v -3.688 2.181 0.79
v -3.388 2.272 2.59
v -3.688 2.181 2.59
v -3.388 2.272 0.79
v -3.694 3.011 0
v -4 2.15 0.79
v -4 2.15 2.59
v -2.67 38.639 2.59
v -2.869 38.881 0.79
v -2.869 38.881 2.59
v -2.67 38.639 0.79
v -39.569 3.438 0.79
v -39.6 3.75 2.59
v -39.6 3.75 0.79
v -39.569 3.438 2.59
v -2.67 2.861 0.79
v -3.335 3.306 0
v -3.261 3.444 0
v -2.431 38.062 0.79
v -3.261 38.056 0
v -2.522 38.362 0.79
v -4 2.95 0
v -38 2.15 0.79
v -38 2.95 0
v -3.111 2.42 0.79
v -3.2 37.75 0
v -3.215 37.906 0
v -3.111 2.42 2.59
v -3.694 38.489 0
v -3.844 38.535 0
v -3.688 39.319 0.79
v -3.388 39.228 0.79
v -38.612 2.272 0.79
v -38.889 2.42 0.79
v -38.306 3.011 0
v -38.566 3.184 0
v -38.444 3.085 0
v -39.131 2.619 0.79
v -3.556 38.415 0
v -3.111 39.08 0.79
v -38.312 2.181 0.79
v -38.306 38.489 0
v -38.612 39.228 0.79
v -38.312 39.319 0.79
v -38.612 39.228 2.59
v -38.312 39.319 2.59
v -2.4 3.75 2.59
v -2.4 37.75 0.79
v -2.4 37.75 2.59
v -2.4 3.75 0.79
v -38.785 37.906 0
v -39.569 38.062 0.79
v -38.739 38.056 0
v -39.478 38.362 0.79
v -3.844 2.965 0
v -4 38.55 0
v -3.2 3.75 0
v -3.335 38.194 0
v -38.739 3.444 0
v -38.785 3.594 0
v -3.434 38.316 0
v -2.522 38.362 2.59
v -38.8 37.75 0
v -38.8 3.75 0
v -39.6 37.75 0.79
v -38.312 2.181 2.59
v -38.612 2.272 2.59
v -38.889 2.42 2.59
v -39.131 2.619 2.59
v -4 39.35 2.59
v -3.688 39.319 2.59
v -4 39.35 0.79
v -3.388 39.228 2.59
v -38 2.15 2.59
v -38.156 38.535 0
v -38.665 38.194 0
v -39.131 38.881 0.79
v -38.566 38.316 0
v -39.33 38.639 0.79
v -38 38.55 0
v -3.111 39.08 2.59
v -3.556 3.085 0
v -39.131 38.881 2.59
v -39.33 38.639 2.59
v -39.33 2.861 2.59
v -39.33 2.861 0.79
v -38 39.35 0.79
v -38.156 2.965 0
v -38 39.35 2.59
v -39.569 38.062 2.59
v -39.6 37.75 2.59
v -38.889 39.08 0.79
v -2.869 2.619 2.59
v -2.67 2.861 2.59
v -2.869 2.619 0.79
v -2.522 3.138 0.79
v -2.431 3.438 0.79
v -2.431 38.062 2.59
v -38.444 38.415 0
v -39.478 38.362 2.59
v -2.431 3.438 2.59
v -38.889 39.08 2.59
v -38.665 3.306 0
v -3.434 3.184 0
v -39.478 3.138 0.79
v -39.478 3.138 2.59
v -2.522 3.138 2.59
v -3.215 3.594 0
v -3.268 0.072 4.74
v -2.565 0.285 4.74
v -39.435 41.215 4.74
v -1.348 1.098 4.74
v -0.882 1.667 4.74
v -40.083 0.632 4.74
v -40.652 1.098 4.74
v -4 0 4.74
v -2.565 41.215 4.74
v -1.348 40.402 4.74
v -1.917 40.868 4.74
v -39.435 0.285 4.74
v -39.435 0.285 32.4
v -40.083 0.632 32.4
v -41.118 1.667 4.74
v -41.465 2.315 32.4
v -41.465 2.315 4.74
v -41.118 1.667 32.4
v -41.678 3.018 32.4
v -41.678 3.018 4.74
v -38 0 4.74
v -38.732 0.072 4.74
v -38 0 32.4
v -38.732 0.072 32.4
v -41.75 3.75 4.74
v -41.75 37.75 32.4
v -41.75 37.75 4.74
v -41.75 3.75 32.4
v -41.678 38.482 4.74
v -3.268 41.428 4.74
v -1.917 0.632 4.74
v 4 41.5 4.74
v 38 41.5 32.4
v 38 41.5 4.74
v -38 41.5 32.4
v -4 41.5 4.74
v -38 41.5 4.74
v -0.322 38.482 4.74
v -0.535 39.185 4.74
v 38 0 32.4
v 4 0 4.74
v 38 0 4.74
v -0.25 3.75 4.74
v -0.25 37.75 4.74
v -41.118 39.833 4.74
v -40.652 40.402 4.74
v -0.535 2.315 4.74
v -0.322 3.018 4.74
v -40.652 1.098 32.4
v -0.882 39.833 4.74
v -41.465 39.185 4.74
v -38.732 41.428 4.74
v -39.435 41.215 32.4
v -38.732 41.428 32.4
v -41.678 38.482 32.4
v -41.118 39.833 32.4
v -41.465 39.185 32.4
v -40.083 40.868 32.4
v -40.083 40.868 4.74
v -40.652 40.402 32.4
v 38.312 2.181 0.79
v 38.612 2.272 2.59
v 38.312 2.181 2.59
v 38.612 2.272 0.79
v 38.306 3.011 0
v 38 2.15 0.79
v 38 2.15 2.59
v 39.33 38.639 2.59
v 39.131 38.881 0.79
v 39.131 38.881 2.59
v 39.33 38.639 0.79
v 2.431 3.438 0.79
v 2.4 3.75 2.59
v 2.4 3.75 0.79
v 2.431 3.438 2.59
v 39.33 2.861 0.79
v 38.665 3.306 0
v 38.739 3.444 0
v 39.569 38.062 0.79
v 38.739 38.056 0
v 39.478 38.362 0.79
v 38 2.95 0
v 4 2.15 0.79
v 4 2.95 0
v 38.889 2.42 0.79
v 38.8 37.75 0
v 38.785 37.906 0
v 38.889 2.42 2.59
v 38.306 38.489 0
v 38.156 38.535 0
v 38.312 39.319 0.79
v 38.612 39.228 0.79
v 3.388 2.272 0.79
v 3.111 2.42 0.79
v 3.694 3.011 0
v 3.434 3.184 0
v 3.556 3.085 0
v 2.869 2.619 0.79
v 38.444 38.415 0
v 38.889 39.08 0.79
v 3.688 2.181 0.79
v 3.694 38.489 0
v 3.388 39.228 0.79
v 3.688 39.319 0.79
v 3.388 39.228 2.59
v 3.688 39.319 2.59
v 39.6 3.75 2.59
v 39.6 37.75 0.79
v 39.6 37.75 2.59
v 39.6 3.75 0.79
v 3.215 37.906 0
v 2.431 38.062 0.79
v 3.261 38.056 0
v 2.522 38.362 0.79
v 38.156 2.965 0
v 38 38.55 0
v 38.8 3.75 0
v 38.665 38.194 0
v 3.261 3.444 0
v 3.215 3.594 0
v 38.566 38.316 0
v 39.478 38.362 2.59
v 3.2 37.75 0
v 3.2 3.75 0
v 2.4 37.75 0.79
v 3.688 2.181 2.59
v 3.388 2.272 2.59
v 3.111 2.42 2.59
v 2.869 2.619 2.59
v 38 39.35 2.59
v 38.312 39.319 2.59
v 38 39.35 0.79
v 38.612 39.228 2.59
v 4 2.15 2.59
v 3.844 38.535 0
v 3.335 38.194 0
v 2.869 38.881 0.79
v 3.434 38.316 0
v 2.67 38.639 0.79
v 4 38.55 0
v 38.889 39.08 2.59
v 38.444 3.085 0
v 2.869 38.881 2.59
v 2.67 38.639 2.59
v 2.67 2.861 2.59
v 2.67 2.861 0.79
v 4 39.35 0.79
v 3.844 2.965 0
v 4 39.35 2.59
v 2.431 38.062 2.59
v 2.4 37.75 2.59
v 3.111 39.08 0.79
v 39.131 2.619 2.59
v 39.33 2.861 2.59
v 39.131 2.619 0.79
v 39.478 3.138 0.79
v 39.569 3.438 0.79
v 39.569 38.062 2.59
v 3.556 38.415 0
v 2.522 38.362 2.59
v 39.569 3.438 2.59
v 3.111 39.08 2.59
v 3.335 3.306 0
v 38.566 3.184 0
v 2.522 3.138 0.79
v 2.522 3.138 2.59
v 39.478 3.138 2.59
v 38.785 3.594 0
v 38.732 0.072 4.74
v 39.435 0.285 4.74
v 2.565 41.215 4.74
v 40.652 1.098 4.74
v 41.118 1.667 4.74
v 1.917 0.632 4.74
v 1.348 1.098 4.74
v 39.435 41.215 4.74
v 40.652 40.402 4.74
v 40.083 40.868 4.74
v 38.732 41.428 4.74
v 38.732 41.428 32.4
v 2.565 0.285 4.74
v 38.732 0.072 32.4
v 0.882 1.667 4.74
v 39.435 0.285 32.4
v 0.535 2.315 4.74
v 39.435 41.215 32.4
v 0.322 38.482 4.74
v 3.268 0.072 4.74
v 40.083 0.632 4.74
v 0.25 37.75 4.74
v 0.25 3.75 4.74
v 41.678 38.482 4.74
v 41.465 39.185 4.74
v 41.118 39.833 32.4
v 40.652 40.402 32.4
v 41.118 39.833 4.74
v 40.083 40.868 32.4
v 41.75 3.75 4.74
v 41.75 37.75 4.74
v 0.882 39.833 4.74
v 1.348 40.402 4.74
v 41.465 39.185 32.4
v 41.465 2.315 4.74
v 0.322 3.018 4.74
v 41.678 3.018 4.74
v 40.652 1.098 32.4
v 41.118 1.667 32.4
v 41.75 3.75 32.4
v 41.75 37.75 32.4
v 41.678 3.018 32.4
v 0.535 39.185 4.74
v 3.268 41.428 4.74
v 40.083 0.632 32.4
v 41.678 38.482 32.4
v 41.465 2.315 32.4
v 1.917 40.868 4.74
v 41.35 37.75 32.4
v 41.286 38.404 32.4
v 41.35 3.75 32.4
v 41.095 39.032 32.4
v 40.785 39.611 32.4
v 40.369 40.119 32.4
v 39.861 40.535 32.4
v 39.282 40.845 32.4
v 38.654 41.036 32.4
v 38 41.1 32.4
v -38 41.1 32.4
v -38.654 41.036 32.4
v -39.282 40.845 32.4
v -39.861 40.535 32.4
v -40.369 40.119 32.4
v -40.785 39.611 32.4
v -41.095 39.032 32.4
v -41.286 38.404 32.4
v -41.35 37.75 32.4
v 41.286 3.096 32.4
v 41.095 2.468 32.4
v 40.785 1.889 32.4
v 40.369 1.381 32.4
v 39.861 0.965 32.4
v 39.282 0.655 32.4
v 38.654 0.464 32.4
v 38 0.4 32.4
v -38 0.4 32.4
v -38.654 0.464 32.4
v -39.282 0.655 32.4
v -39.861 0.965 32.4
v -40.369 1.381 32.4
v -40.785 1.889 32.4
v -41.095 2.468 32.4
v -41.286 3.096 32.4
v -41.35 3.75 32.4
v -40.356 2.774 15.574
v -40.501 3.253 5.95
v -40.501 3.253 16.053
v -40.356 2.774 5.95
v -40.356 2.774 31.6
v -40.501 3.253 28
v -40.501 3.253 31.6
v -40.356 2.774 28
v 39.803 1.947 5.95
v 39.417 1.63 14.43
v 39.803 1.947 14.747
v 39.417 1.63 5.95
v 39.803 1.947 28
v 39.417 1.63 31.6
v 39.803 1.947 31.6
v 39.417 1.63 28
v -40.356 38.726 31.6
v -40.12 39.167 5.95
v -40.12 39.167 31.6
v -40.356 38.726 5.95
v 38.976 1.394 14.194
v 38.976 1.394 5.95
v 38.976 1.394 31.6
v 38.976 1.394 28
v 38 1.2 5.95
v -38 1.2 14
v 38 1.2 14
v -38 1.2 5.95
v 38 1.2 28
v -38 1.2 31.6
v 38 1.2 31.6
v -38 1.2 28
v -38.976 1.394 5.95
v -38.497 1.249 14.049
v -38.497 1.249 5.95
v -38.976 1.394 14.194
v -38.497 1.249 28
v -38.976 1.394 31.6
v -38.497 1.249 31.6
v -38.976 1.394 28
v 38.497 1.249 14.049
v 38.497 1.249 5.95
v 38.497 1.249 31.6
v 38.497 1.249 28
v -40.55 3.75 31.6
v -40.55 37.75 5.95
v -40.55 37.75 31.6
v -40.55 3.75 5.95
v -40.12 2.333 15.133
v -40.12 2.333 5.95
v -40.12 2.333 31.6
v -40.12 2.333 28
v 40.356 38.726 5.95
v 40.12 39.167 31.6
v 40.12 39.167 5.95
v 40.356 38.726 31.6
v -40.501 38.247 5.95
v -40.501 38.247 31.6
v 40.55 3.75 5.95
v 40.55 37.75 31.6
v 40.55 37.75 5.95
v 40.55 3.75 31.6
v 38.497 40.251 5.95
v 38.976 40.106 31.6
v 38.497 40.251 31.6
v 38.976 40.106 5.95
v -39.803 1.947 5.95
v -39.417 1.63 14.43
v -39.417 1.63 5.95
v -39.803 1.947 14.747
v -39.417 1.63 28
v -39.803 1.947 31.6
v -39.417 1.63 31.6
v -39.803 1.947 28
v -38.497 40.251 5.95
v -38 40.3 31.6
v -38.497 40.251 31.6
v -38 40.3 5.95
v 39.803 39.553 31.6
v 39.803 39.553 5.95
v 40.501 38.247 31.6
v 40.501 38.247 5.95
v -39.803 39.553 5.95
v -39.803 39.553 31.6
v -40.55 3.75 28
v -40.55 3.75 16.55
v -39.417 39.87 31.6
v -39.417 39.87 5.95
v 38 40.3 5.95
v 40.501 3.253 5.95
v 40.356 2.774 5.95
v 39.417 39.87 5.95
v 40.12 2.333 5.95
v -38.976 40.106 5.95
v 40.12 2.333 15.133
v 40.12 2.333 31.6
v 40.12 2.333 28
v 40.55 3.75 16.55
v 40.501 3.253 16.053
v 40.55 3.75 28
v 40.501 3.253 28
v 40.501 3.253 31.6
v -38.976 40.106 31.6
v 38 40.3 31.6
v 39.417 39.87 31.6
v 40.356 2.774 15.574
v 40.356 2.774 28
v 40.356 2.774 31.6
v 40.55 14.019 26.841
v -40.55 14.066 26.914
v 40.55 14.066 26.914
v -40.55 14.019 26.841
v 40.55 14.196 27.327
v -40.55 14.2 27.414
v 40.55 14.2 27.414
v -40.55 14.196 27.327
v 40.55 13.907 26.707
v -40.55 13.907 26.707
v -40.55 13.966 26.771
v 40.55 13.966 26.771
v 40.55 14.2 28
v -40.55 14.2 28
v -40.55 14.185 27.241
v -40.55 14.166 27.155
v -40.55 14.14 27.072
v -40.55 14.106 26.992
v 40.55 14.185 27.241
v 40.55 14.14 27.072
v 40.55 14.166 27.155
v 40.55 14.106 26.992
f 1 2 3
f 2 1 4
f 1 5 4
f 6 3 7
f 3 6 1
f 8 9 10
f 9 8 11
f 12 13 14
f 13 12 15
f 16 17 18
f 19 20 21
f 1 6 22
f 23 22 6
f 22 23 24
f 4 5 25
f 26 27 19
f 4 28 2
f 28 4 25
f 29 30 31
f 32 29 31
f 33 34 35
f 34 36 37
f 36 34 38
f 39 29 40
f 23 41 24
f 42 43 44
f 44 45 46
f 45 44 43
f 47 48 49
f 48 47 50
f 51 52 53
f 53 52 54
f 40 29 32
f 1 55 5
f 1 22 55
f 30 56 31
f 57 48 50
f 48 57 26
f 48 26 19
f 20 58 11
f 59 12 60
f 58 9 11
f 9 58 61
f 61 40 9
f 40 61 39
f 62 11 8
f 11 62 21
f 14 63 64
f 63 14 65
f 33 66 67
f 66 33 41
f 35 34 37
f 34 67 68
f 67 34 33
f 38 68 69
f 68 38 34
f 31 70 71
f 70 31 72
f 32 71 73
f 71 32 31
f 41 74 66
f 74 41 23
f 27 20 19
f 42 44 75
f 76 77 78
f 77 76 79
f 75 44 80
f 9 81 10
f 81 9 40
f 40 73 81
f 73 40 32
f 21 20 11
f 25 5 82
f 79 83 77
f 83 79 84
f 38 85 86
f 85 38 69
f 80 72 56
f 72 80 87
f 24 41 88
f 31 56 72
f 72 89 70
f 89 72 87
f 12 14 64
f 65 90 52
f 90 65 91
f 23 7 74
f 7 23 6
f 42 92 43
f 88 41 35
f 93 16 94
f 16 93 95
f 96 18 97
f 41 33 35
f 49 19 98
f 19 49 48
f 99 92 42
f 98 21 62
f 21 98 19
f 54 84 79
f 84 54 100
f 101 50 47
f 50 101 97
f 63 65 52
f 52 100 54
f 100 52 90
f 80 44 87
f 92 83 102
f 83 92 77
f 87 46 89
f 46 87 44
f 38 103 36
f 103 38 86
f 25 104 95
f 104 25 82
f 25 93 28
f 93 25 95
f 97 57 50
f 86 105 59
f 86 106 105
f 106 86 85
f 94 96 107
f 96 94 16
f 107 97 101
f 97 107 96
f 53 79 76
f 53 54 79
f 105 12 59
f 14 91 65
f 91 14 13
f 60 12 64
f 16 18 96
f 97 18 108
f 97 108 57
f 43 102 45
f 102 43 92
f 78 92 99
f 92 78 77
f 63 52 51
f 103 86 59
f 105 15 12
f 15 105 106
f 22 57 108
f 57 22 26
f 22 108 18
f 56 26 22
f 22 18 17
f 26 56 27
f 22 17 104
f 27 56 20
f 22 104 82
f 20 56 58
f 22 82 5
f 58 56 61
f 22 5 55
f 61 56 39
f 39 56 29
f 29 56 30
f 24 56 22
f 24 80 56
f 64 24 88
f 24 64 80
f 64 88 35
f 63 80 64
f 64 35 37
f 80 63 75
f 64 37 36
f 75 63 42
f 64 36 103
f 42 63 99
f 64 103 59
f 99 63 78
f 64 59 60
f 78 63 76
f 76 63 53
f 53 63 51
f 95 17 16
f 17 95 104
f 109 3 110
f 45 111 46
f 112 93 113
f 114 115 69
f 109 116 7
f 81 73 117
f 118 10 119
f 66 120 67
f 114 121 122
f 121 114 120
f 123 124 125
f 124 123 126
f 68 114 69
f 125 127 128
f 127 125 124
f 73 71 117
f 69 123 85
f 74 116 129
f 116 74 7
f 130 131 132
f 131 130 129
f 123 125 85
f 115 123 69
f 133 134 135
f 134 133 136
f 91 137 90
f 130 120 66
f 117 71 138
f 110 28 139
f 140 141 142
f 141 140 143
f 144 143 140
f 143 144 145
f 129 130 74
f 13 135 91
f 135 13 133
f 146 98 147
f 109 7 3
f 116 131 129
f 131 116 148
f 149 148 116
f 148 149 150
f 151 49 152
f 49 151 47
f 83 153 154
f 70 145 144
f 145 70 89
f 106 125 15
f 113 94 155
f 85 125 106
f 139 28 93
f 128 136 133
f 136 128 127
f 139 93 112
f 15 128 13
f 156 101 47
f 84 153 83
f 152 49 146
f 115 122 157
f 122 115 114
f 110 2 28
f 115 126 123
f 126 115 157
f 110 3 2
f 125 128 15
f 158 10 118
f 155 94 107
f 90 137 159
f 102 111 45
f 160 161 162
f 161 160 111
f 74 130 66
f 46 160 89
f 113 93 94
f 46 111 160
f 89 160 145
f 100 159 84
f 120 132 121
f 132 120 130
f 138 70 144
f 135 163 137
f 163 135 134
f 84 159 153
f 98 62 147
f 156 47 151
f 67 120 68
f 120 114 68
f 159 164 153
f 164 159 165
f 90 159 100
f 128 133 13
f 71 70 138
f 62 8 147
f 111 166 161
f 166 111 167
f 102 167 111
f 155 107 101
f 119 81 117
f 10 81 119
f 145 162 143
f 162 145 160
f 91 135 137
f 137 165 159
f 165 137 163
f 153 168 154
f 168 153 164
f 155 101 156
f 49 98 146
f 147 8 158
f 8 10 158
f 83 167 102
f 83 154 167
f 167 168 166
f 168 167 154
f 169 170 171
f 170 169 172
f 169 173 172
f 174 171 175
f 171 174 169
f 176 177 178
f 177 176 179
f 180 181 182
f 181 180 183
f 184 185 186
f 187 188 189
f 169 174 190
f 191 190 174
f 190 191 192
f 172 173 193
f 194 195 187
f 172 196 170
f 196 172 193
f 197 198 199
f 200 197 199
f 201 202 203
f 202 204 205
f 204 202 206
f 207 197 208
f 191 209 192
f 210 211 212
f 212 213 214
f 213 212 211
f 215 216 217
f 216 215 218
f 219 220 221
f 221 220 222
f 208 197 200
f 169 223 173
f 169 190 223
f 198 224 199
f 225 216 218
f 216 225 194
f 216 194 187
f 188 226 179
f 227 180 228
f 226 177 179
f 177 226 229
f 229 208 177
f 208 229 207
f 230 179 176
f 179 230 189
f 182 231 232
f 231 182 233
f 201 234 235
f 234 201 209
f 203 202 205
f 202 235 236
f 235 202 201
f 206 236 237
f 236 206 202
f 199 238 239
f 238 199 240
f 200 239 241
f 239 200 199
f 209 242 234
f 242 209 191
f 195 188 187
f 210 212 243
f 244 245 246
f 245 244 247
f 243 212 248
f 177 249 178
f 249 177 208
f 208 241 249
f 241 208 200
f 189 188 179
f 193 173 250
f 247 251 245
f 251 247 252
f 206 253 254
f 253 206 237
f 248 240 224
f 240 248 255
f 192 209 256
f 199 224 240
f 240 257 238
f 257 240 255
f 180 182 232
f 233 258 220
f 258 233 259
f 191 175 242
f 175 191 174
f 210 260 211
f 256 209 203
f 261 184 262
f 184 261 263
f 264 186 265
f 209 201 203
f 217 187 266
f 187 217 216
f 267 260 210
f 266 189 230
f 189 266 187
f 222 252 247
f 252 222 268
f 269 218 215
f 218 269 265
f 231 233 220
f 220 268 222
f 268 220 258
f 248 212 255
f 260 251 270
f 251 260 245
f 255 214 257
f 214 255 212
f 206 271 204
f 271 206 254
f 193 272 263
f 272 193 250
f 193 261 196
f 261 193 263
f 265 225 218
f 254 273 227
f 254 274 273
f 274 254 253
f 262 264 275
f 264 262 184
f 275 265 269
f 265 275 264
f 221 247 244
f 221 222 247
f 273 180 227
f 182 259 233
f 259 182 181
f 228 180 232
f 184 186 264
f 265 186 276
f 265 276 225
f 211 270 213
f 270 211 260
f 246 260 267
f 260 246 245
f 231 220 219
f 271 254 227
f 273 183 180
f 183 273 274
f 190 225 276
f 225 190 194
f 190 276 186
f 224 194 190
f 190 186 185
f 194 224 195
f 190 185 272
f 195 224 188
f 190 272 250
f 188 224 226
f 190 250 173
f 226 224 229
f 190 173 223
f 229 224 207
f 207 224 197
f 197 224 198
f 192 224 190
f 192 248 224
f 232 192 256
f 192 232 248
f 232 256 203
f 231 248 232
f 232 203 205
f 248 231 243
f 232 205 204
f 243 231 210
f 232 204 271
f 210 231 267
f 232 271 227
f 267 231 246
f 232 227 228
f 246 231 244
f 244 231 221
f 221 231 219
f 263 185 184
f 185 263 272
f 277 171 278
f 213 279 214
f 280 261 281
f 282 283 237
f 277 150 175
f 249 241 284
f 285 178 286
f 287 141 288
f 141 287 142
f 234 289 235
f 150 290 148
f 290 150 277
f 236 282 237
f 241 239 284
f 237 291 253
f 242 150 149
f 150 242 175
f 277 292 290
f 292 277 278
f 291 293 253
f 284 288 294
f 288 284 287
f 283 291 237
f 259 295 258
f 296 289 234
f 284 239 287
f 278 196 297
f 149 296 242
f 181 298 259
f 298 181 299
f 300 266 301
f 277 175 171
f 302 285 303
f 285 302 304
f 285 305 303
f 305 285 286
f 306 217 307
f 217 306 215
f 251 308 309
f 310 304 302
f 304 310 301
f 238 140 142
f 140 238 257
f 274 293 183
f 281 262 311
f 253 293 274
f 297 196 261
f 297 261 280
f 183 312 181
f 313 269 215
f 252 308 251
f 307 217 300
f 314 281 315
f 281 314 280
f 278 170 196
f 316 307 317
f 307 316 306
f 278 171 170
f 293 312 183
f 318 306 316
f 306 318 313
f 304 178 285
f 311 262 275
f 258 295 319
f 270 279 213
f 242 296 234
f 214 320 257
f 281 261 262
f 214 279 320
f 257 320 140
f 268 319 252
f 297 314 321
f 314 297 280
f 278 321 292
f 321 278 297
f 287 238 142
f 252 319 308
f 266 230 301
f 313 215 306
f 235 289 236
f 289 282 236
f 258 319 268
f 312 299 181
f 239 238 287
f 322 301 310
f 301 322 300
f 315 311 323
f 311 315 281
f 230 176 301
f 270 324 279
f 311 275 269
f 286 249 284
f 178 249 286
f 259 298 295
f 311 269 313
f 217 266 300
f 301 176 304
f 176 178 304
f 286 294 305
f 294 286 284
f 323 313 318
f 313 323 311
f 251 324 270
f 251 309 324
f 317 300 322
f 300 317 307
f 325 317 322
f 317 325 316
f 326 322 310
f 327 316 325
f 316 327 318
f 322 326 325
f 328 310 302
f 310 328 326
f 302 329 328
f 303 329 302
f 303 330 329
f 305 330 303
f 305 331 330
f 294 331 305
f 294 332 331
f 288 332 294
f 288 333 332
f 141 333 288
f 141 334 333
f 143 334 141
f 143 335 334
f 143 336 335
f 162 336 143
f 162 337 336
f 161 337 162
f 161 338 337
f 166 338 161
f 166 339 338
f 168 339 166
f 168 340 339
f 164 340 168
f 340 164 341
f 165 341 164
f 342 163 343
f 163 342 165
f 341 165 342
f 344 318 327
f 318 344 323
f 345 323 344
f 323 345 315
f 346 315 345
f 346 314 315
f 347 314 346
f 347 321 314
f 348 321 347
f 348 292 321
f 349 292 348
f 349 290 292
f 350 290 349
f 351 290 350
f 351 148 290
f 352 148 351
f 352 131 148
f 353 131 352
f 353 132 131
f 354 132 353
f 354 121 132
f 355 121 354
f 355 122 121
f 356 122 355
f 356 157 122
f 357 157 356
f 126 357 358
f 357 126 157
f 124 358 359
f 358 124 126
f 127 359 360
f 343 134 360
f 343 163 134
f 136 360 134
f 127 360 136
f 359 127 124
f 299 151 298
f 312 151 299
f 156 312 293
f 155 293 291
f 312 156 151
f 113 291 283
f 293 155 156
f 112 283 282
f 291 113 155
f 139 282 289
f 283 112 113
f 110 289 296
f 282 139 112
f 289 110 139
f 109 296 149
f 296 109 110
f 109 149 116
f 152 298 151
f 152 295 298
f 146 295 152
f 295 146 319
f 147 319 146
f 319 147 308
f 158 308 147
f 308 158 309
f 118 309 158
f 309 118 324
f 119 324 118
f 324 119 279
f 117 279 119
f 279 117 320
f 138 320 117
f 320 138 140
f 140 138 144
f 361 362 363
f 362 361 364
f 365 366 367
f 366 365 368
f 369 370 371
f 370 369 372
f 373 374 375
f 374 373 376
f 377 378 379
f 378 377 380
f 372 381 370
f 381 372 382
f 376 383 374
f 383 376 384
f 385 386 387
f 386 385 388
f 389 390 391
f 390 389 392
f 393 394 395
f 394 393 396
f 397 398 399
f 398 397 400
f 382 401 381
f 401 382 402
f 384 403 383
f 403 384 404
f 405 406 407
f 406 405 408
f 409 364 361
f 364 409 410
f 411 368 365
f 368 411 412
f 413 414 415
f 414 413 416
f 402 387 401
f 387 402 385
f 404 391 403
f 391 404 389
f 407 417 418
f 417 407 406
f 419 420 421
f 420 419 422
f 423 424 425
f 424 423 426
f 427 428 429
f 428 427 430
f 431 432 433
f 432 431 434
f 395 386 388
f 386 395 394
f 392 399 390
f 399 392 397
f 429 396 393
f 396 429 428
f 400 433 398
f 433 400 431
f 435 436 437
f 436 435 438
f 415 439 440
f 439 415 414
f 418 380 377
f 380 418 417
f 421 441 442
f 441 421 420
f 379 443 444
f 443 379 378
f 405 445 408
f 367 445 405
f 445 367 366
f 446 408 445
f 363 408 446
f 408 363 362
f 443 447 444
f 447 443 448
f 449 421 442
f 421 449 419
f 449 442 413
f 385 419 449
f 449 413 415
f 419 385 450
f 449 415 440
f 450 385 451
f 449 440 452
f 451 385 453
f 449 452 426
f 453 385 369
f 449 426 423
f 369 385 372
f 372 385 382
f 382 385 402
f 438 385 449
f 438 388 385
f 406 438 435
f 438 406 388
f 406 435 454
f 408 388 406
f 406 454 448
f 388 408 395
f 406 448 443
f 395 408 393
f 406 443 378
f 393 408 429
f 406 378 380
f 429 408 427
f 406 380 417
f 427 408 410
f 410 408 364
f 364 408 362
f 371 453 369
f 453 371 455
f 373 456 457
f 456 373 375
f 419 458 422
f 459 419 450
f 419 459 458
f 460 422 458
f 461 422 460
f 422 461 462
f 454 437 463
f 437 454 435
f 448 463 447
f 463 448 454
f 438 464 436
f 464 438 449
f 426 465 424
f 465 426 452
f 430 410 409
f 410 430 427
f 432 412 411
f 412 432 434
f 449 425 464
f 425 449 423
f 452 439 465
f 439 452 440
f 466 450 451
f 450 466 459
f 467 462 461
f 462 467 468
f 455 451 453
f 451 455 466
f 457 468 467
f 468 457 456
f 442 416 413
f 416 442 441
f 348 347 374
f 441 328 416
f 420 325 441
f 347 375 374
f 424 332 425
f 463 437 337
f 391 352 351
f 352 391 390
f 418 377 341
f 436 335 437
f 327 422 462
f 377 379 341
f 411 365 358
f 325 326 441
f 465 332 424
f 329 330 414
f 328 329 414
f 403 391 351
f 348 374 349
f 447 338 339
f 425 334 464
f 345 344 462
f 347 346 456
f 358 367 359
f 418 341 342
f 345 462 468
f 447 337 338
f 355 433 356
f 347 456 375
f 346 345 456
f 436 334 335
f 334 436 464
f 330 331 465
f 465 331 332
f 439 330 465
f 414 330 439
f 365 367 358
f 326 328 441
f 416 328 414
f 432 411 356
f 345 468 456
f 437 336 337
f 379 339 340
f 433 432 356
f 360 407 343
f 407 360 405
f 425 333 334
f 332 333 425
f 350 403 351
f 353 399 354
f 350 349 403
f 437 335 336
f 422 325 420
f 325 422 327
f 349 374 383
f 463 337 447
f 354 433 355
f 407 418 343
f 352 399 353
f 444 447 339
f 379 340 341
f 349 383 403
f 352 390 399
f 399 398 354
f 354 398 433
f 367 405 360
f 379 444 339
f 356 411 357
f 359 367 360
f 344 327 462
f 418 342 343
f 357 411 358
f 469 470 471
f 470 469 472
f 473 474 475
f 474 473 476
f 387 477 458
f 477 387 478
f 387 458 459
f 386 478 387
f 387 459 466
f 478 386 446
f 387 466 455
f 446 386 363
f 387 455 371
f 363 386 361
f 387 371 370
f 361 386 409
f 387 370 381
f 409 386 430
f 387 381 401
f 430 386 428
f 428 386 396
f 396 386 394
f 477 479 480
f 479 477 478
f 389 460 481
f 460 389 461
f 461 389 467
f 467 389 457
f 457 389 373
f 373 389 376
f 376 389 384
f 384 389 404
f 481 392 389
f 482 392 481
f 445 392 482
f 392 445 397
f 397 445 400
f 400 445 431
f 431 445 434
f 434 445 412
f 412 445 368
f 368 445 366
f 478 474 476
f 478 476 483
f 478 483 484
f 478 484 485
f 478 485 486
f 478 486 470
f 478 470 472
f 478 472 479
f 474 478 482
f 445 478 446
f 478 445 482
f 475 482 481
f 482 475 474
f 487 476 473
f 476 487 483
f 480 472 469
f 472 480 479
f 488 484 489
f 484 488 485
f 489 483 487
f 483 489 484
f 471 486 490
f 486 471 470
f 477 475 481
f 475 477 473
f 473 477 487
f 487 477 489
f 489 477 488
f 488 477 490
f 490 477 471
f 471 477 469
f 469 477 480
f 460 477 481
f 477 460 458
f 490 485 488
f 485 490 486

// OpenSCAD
// file: ../../../modules/gridfinity.scad
// Gridfinity ベースプレートの共有 module。
// 寸法は Gridfinity 仕様 (Zack Freedman) の baseplate 輪郭に従う:
//   ピッチ 42、ソケット上端開口 41.5 (角 R4)、上から 45° 面取り 2.15 →
//   垂直 1.8 (37.2 角・R1.85) → 45° 面取り 0.7 → 底 35.8 角 (R1.15)。
//   ソケット深さ = 2.15 + 1.8 + 0.7 = 4.65。
//
// 座標系: X が列方向 (中央が 0)、Y が行方向 (板の前端が 0)、Z=0 が板の底面。
// 板の外形は grid とは独立に rim で与えるので、grid より大きい板 (縁付き) を
// 作れる。ソケットは rim=[left, right, front, back] の内側へ 42 ピッチで並ぶ。

gf_pitch = 42;
gf_socket_top = 41.5; // 上端開口
gf_socket_mid = 37.2; // 垂直部
gf_socket_bot = 35.8; // 底
gf_socket_r_top = 4;
gf_socket_r_mid = 1.85;
gf_socket_r_bot = 1.15;
gf_chamfer_top = 2.15;
gf_wall_h = 1.8;
gf_chamfer_bot = 0.7;
gf_socket_depth = gf_chamfer_top + gf_wall_h + gf_chamfer_bot; // 4.65
gf_fn = 32;
gf_eps = 0.01; // hull 用の薄板の厚さ
gf_over = 0.5; // 切削の抜き代

// 角丸正方形または矩形 (w は一辺、または [幅, 奥行き]、角 R)
module
gf_rounded_square(w, r)
{
    offset(r = r, $fn = gf_fn)
        square(is_list(w) ? w - [ 2 * r, 2 * r ] : w - 2 * r, center = true);
}

// 厚さ gf_eps の角丸正方形の薄板を z に置く (hull の骨)
module
gf_slab(w, r, z)
{
    translate([ 0, 0, z ]) linear_extrude(gf_eps) gf_rounded_square(w, r);
}

// ソケット1個の切削体。z=0 がソケットの底 (床の天面)、+Z へ 4.65 で天面に出る。
// clearance は嵌合の逃げで、輪郭を全周へ clearance だけ外へ出す (幅 +2c、角 R
// +c)。pitch_x は X 方向のセル幅。端数でも角 R と面取りの寸法を保つ。
module
gf_socket_cut(clearance = 0, pitch_x = gf_pitch)
{
    z1 = gf_chamfer_bot;
    z2 = z1 + gf_wall_h;
    z3 = gf_socket_depth;
    c = clearance;
    assert(pitch_x > gf_pitch - gf_socket_top + 2 * gf_socket_r_top,
           "Cell width is too small for the socket corner radius");
    delta = [ pitch_x - gf_pitch, 0 ];
    bot = [ gf_socket_bot + 2 * c, gf_socket_bot + 2 * c ] + delta;
    mid = [ gf_socket_mid + 2 * c, gf_socket_mid + 2 * c ] + delta;
    top = [ gf_socket_top + 2 * c, gf_socket_top + 2 * c ] + delta;
    hull()
    {
        gf_slab(bot, gf_socket_r_bot + c, 0);
        gf_slab(mid, gf_socket_r_mid + c, z1 - gf_eps);
    }
    hull()
    {
        gf_slab(mid, gf_socket_r_mid + c, z1 - gf_eps);
        gf_slab(mid, gf_socket_r_mid + c, z2 - gf_eps);
    }
    hull()
    {
        gf_slab(mid, gf_socket_r_mid + c, z2 - gf_eps);
        gf_slab(top, gf_socket_r_top + c, z3 - gf_eps);
    }
    // 天面より上へ抜く (天面と同一平面の退化した面を残さない)
    gf_slab(top, gf_socket_r_top + c, z3 - gf_eps);
    translate([ 0, 0, z3 - gf_eps ]) linear_extrude(gf_over + gf_eps)
        gf_rounded_square(top, gf_socket_r_top + c);
}

// ベースプレート。cols x rows のソケットを床 floor_t の上に彫る。
// rim = [left, right, front, back] はソケット列の外側に残す縁の幅。
// 板の幅 = cols*42 + left + right、奥行き = rows*42 + front + back。
// cols の端数は左端の細幅セルになる。rows は正の整数。
// clearance はソケットの嵌合の逃げ (gf_socket_cut を参照)。
module
gf_baseplate(cols, rows, rim = [ 0, 0, 0, 0 ], floor_t = 1, clearance = 0)
{
    grid_w = cols * gf_pitch;
    grid_d = rows * gf_pitch;
    plate_w = grid_w + rim[0] + rim[1];
    plate_d = grid_d + rim[2] + rim[3];
    x0 = -plate_w / 2 + rim[0]; // ソケット列の左端
    first_pitch = grid_w - (ceil(cols) - 1) * gf_pitch;
    difference()
    {
        translate([ -plate_w / 2, 0, 0 ])
            cube([ plate_w, plate_d, floor_t + gf_socket_depth ]);
        for (c = [0:ceil(cols) - 1], r = [0:rows - 1])
            translate([
                x0 + (c == 0 ? first_pitch / 2
                             : first_pitch + (c - 0.5) * gf_pitch),
                rim[2] + (r + 0.5) * gf_pitch,
                floor_t
            ]) gf_socket_cut(clearance, c == 0 ? first_pitch : gf_pitch);
    }
}
// file: ../../../modules/gridfinity_bins.scad
include <gridfinity_bin.scad>

// assets/gridfinity-bin/ の bin 群の共通値と、サイズ 3 引数の払い出し口。
// 単体では何も描かない。設計の経緯と確定値は
// ledger/designs/gridfinity-bin-4u.md が正本。
// 通常binは4U/9U、X={1,1.5,2,2.5,3} × Y={1,2,3,4,5,5.5}。
// 両軸に端数を持つ組み合わせはassetに置かない（各高さ28種）。
// Xが横、Yがラベルの壁から奥、unitsが高さ（7mm単位）。
wall = 1.2;    // 0.4 ノズル 3 本
floor_t = 1.2; // 底 (4.75) の上に載せる床。床の天面 z = 5.95
label_d = 13;  // 12mm 幅のラベルシールを貼る天板の張り出し
label_t = 1; // 天板の厚さ (user 指定)。下は 45° の無垢のくさび
label_r = 1; // 天板の先端と 45° 面の境目の R (user 指定)
// カードケース (goods/card_case_2x3x4u.scad) の値。カードは ISO/IEC 7810 ID-1 (85.6 × 54 ×
// 0.76、隅 R3) で、長辺を Y (rows 方向) に寝かせ、X 中央・手前の壁から 10 奥に置く。ポケットは
// カードより 1 大きい (片側 0.5)。右奥のマスは壁の内面まで抜き、床と底を外形に平行な 45° の窪みにする。
// ポケットの左右の埋めの天面 (幅 13.05) が 12mm のラベルを貼る帯。ポケットと穴の交点の
// 縦エッジは丸める (開口の上縁は丸めない: 壁を上端まで垂直に保ち、収まる枚数を減らさない)
card_w = 54;    // カードの短辺 (X)。user 指定「高さ 54」
card_d = 85.6;  // カードの長辺 (Y)。user 指定「幅 85.6」
card_clear = 1; // ポケットの余裕 (user 指定「+1mm」)
// ポケットの手前の辺の、手前の壁の内面からの距離 (user 指定「10mm」)
card_off = 10;
// ポケットの平面の隅 R (user 指定「角の丸み 3mm」。ID-1 の隅は 2.88..3.48)
card_r = 3;
// ポケットと穴が交わる所の、埋めの凸の縦エッジの R (指の当たる角)
card_edge_r = 2;
recess_skin = floor_t + 1.75; // 窪みの床 z (底の皮)。user 指定「壁厚と同じ 1.2 は過剰、1.75 返す」

function bin_contract(cols, rows, units) = str("CONTRACT units=",
                                               units,
                                               " pitch=",
                                               gf_pitch,
                                               " outer=",
                                               gfb_outer,
                                               " h=",
                                               units* gfb_unit,
                                               " lip=",
                                               gfb_lip_h,
                                               " base=",
                                               gfb_base_bot,
                                               "/",
                                               gfb_base_mid,
                                               "/",
                                               gfb_outer,
                                               " base_h=",
                                               gfb_base_h,
                                               " wall=",
                                               wall,
                                               " floor_top=",
                                               gfb_base_h + floor_t,
                                               " label=",
                                               label_d,
                                               "x",
                                               label_t,
                                               " wedge=45 fillet=",
                                               label_r,
                                               " bin=",
                                               cols,
                                               "x",
                                               rows,
                                               " size=",
                                               cols* gf_pitch - 0.5,
                                               "x",
                                               rows* gf_pitch - 0.5);

// (cols, rows, units) でラベル付き bin を払い出す。例: gridfinity_bin(2, 4, 4)
module
gridfinity_bin(cols, rows, units = 4)
{
    echo(bin_contract(cols, rows, units));
    gfb_bin(cols, rows, units, wall, floor_t, label_d, label_t, label_r);
}

function card_contract(cols, rows, units) = str("CONTRACT card units=",
                                                units,
                                                " bin=",
                                                cols,
                                                "x",
                                                rows,
                                                " size=",
                                                cols* gf_pitch - 0.5,
                                                "x",
                                                rows* gf_pitch - 0.5,
                                                " h=",
                                                units* gfb_unit,
                                                " lip=",
                                                gfb_lip_h,
                                                " floor_top=",
                                                gfb_base_h + floor_t,
                                                " card=",
                                                card_w,
                                                "x",
                                                card_d,
                                                " pocket=",
                                                card_w + card_clear,
                                                "x",
                                                card_d + card_clear,
                                                " at=",
                                                -(card_w + card_clear) / 2,
                                                ",",
                                                wall + card_off,
                                                " hole=",
                                                (cols - 1) / 2 * gf_pitch - gfb_outer / 2,
                                                ",",
                                                (rows - 0.5) * gf_pitch - 0.25 - gfb_outer / 2,
                                                " hole_r=",
                                                gfb_outer_r - wall,
                                                " recess=",
                                                gfb_outer - 2 * wall,
                                                "/",
                                                gfb_base_mid - 2 * wall,
                                                " recess_floor=",
                                                recess_skin,
                                                " r=",
                                                card_r,
                                                " edge_r=",
                                                card_edge_r);

// (cols, rows, units) でカードケースを払い出す。例: gridfinity_card_case(2, 3, 4)
module
gridfinity_card_case(cols, rows, units = 4)
{
    echo(card_contract(cols, rows, units));
    gfb_card_case(cols,
                  rows,
                  units,
                  wall,
                  floor_t,
                  [ card_w, card_d ],
                  card_clear,
                  card_off,
                  card_r,
                  recess_skin,
                  card_edge_r);
}
// main file
include <../../../modules/gridfinity_bins.scad>

gridfinity_bin(2, 1, 4);
